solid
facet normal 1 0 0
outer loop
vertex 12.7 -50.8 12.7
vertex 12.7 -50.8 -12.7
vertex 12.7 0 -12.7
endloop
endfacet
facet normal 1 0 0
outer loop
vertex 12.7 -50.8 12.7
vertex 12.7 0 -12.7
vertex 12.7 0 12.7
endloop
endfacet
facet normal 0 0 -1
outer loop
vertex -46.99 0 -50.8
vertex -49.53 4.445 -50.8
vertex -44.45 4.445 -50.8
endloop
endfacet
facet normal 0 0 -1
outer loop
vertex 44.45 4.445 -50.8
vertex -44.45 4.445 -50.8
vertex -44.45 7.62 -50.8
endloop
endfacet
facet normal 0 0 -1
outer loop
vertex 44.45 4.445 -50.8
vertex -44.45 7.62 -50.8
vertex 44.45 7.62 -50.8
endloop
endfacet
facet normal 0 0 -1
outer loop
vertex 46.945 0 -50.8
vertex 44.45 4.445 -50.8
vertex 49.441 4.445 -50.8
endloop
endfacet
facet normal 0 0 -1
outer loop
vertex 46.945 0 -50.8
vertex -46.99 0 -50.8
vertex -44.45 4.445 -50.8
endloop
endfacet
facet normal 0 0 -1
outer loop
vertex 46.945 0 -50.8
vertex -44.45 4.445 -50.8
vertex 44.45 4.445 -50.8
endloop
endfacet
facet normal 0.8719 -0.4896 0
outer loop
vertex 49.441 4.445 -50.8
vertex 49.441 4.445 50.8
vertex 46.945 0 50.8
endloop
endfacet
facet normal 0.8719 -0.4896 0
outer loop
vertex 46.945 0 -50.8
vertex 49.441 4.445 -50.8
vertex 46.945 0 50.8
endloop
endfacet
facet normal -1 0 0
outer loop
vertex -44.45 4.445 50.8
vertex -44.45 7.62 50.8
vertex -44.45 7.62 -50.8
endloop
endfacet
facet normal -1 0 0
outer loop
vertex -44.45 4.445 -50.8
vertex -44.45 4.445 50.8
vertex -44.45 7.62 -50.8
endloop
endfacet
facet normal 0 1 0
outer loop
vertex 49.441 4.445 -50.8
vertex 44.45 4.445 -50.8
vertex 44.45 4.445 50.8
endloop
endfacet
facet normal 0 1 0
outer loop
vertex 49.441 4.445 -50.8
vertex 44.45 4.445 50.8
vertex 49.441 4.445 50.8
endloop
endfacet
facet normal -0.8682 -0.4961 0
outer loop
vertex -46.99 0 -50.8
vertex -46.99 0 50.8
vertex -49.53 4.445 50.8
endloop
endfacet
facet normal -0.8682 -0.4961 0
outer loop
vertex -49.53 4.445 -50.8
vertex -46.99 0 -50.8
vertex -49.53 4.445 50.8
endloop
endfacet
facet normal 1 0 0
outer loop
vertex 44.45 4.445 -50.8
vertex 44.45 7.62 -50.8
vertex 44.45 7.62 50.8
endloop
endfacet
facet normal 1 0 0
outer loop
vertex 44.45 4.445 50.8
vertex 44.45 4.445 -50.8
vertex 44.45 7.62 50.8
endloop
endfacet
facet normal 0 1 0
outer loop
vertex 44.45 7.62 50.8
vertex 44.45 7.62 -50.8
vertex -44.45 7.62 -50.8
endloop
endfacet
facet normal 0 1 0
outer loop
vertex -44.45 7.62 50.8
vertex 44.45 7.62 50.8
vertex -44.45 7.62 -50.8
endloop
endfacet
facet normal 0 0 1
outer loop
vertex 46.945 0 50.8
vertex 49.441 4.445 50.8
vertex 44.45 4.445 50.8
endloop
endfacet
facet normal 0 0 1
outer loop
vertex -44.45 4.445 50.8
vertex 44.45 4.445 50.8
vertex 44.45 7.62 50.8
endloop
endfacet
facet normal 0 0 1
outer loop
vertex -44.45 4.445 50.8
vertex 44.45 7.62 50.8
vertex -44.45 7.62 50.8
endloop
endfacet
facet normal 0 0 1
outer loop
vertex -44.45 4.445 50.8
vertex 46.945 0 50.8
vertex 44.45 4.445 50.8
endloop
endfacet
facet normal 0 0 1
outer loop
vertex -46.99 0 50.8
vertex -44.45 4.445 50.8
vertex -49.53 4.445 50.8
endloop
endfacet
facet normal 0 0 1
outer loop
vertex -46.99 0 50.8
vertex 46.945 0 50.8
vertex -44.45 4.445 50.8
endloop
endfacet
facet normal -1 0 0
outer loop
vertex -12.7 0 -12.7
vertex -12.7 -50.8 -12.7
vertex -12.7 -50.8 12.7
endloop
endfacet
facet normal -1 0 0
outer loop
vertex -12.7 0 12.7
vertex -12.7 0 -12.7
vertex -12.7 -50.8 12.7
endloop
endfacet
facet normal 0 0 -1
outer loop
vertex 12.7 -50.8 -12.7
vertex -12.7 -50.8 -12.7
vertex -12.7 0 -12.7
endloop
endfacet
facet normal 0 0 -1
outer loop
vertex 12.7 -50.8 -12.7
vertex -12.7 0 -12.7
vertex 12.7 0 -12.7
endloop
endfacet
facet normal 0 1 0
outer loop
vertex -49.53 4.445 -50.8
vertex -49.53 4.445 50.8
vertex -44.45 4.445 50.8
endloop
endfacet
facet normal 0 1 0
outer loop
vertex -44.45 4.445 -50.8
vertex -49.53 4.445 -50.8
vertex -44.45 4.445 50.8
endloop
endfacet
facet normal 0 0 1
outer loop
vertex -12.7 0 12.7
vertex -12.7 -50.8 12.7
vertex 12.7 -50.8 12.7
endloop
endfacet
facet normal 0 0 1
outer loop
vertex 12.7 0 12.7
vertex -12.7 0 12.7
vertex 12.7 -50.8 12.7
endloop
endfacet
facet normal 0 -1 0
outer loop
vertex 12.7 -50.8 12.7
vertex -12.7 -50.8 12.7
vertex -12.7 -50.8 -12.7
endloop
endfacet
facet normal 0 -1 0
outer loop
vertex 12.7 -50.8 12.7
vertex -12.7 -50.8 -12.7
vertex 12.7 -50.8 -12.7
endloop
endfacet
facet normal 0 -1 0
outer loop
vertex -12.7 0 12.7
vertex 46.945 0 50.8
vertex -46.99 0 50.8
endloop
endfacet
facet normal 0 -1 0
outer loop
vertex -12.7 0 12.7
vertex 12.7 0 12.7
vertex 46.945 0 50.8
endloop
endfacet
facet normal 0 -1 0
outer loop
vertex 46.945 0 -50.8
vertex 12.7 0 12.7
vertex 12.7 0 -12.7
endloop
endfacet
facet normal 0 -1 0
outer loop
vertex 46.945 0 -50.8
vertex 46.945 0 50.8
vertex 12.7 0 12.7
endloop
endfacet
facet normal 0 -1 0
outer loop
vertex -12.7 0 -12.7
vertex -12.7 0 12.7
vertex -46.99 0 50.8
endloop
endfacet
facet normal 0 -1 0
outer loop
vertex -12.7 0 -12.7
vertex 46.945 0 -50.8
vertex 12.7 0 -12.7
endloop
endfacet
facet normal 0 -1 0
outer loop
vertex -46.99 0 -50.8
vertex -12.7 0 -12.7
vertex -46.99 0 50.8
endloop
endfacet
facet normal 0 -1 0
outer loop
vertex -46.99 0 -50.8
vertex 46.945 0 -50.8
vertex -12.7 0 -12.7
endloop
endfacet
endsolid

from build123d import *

# Parameters (mm, degrees)
SKETCH1_R           = 6.35
BOSS_EXTRUDE2_DEPTH = 7.62
SKETCH3_R           = 6.35
CUT_EXTRUDE2_DEPTH  = 3.175
SKETCH4_W           = 25.4
SKETCH4_H           = 25.4
BOSS_EXTRUDE3_DEPTH = 50.8
CUT_EXTRUDE4_DEPTH  = 102.6


with BuildPart() as part:
    # Sketch1 → Boss-Extrude2 (new body)
    with BuildSketch(Plane(origin=(0, 0, 0), x_dir=(1, 0, 0), z_dir=(0, 1, 0))):
        with BuildLine():
            Line((-69.85, 50.8), (69.85, 50.8))
            ThreePointArc((69.85, 50.8), (87.810512242, 43.360512242), (95.25, 25.4))
            Line((95.25, 25.4), (95.25, -25.4))
            ThreePointArc((95.25, -25.4), (87.810512242, -43.360512242), (69.85, -50.8))
            Line((69.85, -50.8), (-69.85, -50.8))
            ThreePointArc((-69.85, -50.8), (-87.810512242, -43.360512242), (-95.25, -25.4))
            Line((-95.25, -25.4), (-95.25, 25.4))
            ThreePointArc((-95.25, 25.4), (-87.810512242, 43.360512242), (-69.85, 50.8))
        make_face()
        with Locations((-69.85, 25.4)):
            Circle(SKETCH1_R, mode=Mode.SUBTRACT)
        with Locations((69.85, -25.4)):
            Circle(SKETCH1_R, mode=Mode.SUBTRACT)
        with Locations((69.85, 25.4)):
            Circle(SKETCH1_R, mode=Mode.SUBTRACT)
        with Locations((-69.85, -25.4)):
            Circle(SKETCH1_R, mode=Mode.SUBTRACT)
    extrude(amount=BOSS_EXTRUDE2_DEPTH)

    # Sketch3 → Cut-Extrude2 (cut)
    with BuildSketch(Plane(origin=(0, 7.62, 0), x_dir=(1, 0, 0), z_dir=(0, 1, 0))):
        with BuildLine():
            Line((-44.45, -50.8), (-44.45, 50.8))
            Line((-44.45, 50.8), (-69.85, 50.8))
            ThreePointArc((-69.85, 50.8), (-87.810512242, 43.360512242), (-95.25, 25.4))
            Line((-95.25, 25.4), (-95.25, -25.4))
            ThreePointArc((-95.25, -25.4), (-87.810512242, -43.360512242), (-69.85, -50.8))
            Line((-69.85, -50.8), (-44.45, -50.8))
        make_face()
        with Locations((-69.85, -25.4)):
            Circle(SKETCH3_R, mode=Mode.SUBTRACT)
        with Locations((-69.85, 25.4)):
            Circle(SKETCH3_R, mode=Mode.SUBTRACT)
        with BuildLine():
            Line((69.85, 50.8), (44.45, 50.8))
            Line((44.45, 50.8), (44.45, -50.8))
            Line((44.45, -50.8), (69.85, -50.8))
            ThreePointArc((69.85, -50.8), (87.810512242, -43.360512242), (95.25, -25.4))
            Line((95.25, -25.4), (95.25, 25.4))
            ThreePointArc((95.25, 25.4), (87.810512242, 43.360512242), (69.85, 50.8))
        make_face()
        with Locations((69.85, -25.4)):
            Circle(SKETCH3_R, mode=Mode.SUBTRACT)
        with Locations((69.85, 25.4)):
            Circle(SKETCH3_R, mode=Mode.SUBTRACT)
    extrude(amount=-CUT_EXTRUDE2_DEPTH, mode=Mode.SUBTRACT)

    # Sketch4 → Boss-Extrude3 (add)
    with BuildSketch(Plane.XZ):
        Rectangle(SKETCH4_W, SKETCH4_H)
    extrude(amount=BOSS_EXTRUDE3_DEPTH)

    # Sketch5 → Cut-Extrude4 (cut, through all)
    with BuildSketch(Plane.XY.offset(50.8)):
        Polygon((-49.53, 4.445), (-110.026455684, 4.445), (-110.026455684, 0), (-46.99, 0), align=None)
        Polygon((49.44093255, 4.445), (46.945466275, 0), (109.42401757, 0), (109.42401757, 4.445), align=None)
    extrude(amount=-CUT_EXTRUDE4_DEPTH, mode=Mode.SUBTRACT)


solid = part.part
